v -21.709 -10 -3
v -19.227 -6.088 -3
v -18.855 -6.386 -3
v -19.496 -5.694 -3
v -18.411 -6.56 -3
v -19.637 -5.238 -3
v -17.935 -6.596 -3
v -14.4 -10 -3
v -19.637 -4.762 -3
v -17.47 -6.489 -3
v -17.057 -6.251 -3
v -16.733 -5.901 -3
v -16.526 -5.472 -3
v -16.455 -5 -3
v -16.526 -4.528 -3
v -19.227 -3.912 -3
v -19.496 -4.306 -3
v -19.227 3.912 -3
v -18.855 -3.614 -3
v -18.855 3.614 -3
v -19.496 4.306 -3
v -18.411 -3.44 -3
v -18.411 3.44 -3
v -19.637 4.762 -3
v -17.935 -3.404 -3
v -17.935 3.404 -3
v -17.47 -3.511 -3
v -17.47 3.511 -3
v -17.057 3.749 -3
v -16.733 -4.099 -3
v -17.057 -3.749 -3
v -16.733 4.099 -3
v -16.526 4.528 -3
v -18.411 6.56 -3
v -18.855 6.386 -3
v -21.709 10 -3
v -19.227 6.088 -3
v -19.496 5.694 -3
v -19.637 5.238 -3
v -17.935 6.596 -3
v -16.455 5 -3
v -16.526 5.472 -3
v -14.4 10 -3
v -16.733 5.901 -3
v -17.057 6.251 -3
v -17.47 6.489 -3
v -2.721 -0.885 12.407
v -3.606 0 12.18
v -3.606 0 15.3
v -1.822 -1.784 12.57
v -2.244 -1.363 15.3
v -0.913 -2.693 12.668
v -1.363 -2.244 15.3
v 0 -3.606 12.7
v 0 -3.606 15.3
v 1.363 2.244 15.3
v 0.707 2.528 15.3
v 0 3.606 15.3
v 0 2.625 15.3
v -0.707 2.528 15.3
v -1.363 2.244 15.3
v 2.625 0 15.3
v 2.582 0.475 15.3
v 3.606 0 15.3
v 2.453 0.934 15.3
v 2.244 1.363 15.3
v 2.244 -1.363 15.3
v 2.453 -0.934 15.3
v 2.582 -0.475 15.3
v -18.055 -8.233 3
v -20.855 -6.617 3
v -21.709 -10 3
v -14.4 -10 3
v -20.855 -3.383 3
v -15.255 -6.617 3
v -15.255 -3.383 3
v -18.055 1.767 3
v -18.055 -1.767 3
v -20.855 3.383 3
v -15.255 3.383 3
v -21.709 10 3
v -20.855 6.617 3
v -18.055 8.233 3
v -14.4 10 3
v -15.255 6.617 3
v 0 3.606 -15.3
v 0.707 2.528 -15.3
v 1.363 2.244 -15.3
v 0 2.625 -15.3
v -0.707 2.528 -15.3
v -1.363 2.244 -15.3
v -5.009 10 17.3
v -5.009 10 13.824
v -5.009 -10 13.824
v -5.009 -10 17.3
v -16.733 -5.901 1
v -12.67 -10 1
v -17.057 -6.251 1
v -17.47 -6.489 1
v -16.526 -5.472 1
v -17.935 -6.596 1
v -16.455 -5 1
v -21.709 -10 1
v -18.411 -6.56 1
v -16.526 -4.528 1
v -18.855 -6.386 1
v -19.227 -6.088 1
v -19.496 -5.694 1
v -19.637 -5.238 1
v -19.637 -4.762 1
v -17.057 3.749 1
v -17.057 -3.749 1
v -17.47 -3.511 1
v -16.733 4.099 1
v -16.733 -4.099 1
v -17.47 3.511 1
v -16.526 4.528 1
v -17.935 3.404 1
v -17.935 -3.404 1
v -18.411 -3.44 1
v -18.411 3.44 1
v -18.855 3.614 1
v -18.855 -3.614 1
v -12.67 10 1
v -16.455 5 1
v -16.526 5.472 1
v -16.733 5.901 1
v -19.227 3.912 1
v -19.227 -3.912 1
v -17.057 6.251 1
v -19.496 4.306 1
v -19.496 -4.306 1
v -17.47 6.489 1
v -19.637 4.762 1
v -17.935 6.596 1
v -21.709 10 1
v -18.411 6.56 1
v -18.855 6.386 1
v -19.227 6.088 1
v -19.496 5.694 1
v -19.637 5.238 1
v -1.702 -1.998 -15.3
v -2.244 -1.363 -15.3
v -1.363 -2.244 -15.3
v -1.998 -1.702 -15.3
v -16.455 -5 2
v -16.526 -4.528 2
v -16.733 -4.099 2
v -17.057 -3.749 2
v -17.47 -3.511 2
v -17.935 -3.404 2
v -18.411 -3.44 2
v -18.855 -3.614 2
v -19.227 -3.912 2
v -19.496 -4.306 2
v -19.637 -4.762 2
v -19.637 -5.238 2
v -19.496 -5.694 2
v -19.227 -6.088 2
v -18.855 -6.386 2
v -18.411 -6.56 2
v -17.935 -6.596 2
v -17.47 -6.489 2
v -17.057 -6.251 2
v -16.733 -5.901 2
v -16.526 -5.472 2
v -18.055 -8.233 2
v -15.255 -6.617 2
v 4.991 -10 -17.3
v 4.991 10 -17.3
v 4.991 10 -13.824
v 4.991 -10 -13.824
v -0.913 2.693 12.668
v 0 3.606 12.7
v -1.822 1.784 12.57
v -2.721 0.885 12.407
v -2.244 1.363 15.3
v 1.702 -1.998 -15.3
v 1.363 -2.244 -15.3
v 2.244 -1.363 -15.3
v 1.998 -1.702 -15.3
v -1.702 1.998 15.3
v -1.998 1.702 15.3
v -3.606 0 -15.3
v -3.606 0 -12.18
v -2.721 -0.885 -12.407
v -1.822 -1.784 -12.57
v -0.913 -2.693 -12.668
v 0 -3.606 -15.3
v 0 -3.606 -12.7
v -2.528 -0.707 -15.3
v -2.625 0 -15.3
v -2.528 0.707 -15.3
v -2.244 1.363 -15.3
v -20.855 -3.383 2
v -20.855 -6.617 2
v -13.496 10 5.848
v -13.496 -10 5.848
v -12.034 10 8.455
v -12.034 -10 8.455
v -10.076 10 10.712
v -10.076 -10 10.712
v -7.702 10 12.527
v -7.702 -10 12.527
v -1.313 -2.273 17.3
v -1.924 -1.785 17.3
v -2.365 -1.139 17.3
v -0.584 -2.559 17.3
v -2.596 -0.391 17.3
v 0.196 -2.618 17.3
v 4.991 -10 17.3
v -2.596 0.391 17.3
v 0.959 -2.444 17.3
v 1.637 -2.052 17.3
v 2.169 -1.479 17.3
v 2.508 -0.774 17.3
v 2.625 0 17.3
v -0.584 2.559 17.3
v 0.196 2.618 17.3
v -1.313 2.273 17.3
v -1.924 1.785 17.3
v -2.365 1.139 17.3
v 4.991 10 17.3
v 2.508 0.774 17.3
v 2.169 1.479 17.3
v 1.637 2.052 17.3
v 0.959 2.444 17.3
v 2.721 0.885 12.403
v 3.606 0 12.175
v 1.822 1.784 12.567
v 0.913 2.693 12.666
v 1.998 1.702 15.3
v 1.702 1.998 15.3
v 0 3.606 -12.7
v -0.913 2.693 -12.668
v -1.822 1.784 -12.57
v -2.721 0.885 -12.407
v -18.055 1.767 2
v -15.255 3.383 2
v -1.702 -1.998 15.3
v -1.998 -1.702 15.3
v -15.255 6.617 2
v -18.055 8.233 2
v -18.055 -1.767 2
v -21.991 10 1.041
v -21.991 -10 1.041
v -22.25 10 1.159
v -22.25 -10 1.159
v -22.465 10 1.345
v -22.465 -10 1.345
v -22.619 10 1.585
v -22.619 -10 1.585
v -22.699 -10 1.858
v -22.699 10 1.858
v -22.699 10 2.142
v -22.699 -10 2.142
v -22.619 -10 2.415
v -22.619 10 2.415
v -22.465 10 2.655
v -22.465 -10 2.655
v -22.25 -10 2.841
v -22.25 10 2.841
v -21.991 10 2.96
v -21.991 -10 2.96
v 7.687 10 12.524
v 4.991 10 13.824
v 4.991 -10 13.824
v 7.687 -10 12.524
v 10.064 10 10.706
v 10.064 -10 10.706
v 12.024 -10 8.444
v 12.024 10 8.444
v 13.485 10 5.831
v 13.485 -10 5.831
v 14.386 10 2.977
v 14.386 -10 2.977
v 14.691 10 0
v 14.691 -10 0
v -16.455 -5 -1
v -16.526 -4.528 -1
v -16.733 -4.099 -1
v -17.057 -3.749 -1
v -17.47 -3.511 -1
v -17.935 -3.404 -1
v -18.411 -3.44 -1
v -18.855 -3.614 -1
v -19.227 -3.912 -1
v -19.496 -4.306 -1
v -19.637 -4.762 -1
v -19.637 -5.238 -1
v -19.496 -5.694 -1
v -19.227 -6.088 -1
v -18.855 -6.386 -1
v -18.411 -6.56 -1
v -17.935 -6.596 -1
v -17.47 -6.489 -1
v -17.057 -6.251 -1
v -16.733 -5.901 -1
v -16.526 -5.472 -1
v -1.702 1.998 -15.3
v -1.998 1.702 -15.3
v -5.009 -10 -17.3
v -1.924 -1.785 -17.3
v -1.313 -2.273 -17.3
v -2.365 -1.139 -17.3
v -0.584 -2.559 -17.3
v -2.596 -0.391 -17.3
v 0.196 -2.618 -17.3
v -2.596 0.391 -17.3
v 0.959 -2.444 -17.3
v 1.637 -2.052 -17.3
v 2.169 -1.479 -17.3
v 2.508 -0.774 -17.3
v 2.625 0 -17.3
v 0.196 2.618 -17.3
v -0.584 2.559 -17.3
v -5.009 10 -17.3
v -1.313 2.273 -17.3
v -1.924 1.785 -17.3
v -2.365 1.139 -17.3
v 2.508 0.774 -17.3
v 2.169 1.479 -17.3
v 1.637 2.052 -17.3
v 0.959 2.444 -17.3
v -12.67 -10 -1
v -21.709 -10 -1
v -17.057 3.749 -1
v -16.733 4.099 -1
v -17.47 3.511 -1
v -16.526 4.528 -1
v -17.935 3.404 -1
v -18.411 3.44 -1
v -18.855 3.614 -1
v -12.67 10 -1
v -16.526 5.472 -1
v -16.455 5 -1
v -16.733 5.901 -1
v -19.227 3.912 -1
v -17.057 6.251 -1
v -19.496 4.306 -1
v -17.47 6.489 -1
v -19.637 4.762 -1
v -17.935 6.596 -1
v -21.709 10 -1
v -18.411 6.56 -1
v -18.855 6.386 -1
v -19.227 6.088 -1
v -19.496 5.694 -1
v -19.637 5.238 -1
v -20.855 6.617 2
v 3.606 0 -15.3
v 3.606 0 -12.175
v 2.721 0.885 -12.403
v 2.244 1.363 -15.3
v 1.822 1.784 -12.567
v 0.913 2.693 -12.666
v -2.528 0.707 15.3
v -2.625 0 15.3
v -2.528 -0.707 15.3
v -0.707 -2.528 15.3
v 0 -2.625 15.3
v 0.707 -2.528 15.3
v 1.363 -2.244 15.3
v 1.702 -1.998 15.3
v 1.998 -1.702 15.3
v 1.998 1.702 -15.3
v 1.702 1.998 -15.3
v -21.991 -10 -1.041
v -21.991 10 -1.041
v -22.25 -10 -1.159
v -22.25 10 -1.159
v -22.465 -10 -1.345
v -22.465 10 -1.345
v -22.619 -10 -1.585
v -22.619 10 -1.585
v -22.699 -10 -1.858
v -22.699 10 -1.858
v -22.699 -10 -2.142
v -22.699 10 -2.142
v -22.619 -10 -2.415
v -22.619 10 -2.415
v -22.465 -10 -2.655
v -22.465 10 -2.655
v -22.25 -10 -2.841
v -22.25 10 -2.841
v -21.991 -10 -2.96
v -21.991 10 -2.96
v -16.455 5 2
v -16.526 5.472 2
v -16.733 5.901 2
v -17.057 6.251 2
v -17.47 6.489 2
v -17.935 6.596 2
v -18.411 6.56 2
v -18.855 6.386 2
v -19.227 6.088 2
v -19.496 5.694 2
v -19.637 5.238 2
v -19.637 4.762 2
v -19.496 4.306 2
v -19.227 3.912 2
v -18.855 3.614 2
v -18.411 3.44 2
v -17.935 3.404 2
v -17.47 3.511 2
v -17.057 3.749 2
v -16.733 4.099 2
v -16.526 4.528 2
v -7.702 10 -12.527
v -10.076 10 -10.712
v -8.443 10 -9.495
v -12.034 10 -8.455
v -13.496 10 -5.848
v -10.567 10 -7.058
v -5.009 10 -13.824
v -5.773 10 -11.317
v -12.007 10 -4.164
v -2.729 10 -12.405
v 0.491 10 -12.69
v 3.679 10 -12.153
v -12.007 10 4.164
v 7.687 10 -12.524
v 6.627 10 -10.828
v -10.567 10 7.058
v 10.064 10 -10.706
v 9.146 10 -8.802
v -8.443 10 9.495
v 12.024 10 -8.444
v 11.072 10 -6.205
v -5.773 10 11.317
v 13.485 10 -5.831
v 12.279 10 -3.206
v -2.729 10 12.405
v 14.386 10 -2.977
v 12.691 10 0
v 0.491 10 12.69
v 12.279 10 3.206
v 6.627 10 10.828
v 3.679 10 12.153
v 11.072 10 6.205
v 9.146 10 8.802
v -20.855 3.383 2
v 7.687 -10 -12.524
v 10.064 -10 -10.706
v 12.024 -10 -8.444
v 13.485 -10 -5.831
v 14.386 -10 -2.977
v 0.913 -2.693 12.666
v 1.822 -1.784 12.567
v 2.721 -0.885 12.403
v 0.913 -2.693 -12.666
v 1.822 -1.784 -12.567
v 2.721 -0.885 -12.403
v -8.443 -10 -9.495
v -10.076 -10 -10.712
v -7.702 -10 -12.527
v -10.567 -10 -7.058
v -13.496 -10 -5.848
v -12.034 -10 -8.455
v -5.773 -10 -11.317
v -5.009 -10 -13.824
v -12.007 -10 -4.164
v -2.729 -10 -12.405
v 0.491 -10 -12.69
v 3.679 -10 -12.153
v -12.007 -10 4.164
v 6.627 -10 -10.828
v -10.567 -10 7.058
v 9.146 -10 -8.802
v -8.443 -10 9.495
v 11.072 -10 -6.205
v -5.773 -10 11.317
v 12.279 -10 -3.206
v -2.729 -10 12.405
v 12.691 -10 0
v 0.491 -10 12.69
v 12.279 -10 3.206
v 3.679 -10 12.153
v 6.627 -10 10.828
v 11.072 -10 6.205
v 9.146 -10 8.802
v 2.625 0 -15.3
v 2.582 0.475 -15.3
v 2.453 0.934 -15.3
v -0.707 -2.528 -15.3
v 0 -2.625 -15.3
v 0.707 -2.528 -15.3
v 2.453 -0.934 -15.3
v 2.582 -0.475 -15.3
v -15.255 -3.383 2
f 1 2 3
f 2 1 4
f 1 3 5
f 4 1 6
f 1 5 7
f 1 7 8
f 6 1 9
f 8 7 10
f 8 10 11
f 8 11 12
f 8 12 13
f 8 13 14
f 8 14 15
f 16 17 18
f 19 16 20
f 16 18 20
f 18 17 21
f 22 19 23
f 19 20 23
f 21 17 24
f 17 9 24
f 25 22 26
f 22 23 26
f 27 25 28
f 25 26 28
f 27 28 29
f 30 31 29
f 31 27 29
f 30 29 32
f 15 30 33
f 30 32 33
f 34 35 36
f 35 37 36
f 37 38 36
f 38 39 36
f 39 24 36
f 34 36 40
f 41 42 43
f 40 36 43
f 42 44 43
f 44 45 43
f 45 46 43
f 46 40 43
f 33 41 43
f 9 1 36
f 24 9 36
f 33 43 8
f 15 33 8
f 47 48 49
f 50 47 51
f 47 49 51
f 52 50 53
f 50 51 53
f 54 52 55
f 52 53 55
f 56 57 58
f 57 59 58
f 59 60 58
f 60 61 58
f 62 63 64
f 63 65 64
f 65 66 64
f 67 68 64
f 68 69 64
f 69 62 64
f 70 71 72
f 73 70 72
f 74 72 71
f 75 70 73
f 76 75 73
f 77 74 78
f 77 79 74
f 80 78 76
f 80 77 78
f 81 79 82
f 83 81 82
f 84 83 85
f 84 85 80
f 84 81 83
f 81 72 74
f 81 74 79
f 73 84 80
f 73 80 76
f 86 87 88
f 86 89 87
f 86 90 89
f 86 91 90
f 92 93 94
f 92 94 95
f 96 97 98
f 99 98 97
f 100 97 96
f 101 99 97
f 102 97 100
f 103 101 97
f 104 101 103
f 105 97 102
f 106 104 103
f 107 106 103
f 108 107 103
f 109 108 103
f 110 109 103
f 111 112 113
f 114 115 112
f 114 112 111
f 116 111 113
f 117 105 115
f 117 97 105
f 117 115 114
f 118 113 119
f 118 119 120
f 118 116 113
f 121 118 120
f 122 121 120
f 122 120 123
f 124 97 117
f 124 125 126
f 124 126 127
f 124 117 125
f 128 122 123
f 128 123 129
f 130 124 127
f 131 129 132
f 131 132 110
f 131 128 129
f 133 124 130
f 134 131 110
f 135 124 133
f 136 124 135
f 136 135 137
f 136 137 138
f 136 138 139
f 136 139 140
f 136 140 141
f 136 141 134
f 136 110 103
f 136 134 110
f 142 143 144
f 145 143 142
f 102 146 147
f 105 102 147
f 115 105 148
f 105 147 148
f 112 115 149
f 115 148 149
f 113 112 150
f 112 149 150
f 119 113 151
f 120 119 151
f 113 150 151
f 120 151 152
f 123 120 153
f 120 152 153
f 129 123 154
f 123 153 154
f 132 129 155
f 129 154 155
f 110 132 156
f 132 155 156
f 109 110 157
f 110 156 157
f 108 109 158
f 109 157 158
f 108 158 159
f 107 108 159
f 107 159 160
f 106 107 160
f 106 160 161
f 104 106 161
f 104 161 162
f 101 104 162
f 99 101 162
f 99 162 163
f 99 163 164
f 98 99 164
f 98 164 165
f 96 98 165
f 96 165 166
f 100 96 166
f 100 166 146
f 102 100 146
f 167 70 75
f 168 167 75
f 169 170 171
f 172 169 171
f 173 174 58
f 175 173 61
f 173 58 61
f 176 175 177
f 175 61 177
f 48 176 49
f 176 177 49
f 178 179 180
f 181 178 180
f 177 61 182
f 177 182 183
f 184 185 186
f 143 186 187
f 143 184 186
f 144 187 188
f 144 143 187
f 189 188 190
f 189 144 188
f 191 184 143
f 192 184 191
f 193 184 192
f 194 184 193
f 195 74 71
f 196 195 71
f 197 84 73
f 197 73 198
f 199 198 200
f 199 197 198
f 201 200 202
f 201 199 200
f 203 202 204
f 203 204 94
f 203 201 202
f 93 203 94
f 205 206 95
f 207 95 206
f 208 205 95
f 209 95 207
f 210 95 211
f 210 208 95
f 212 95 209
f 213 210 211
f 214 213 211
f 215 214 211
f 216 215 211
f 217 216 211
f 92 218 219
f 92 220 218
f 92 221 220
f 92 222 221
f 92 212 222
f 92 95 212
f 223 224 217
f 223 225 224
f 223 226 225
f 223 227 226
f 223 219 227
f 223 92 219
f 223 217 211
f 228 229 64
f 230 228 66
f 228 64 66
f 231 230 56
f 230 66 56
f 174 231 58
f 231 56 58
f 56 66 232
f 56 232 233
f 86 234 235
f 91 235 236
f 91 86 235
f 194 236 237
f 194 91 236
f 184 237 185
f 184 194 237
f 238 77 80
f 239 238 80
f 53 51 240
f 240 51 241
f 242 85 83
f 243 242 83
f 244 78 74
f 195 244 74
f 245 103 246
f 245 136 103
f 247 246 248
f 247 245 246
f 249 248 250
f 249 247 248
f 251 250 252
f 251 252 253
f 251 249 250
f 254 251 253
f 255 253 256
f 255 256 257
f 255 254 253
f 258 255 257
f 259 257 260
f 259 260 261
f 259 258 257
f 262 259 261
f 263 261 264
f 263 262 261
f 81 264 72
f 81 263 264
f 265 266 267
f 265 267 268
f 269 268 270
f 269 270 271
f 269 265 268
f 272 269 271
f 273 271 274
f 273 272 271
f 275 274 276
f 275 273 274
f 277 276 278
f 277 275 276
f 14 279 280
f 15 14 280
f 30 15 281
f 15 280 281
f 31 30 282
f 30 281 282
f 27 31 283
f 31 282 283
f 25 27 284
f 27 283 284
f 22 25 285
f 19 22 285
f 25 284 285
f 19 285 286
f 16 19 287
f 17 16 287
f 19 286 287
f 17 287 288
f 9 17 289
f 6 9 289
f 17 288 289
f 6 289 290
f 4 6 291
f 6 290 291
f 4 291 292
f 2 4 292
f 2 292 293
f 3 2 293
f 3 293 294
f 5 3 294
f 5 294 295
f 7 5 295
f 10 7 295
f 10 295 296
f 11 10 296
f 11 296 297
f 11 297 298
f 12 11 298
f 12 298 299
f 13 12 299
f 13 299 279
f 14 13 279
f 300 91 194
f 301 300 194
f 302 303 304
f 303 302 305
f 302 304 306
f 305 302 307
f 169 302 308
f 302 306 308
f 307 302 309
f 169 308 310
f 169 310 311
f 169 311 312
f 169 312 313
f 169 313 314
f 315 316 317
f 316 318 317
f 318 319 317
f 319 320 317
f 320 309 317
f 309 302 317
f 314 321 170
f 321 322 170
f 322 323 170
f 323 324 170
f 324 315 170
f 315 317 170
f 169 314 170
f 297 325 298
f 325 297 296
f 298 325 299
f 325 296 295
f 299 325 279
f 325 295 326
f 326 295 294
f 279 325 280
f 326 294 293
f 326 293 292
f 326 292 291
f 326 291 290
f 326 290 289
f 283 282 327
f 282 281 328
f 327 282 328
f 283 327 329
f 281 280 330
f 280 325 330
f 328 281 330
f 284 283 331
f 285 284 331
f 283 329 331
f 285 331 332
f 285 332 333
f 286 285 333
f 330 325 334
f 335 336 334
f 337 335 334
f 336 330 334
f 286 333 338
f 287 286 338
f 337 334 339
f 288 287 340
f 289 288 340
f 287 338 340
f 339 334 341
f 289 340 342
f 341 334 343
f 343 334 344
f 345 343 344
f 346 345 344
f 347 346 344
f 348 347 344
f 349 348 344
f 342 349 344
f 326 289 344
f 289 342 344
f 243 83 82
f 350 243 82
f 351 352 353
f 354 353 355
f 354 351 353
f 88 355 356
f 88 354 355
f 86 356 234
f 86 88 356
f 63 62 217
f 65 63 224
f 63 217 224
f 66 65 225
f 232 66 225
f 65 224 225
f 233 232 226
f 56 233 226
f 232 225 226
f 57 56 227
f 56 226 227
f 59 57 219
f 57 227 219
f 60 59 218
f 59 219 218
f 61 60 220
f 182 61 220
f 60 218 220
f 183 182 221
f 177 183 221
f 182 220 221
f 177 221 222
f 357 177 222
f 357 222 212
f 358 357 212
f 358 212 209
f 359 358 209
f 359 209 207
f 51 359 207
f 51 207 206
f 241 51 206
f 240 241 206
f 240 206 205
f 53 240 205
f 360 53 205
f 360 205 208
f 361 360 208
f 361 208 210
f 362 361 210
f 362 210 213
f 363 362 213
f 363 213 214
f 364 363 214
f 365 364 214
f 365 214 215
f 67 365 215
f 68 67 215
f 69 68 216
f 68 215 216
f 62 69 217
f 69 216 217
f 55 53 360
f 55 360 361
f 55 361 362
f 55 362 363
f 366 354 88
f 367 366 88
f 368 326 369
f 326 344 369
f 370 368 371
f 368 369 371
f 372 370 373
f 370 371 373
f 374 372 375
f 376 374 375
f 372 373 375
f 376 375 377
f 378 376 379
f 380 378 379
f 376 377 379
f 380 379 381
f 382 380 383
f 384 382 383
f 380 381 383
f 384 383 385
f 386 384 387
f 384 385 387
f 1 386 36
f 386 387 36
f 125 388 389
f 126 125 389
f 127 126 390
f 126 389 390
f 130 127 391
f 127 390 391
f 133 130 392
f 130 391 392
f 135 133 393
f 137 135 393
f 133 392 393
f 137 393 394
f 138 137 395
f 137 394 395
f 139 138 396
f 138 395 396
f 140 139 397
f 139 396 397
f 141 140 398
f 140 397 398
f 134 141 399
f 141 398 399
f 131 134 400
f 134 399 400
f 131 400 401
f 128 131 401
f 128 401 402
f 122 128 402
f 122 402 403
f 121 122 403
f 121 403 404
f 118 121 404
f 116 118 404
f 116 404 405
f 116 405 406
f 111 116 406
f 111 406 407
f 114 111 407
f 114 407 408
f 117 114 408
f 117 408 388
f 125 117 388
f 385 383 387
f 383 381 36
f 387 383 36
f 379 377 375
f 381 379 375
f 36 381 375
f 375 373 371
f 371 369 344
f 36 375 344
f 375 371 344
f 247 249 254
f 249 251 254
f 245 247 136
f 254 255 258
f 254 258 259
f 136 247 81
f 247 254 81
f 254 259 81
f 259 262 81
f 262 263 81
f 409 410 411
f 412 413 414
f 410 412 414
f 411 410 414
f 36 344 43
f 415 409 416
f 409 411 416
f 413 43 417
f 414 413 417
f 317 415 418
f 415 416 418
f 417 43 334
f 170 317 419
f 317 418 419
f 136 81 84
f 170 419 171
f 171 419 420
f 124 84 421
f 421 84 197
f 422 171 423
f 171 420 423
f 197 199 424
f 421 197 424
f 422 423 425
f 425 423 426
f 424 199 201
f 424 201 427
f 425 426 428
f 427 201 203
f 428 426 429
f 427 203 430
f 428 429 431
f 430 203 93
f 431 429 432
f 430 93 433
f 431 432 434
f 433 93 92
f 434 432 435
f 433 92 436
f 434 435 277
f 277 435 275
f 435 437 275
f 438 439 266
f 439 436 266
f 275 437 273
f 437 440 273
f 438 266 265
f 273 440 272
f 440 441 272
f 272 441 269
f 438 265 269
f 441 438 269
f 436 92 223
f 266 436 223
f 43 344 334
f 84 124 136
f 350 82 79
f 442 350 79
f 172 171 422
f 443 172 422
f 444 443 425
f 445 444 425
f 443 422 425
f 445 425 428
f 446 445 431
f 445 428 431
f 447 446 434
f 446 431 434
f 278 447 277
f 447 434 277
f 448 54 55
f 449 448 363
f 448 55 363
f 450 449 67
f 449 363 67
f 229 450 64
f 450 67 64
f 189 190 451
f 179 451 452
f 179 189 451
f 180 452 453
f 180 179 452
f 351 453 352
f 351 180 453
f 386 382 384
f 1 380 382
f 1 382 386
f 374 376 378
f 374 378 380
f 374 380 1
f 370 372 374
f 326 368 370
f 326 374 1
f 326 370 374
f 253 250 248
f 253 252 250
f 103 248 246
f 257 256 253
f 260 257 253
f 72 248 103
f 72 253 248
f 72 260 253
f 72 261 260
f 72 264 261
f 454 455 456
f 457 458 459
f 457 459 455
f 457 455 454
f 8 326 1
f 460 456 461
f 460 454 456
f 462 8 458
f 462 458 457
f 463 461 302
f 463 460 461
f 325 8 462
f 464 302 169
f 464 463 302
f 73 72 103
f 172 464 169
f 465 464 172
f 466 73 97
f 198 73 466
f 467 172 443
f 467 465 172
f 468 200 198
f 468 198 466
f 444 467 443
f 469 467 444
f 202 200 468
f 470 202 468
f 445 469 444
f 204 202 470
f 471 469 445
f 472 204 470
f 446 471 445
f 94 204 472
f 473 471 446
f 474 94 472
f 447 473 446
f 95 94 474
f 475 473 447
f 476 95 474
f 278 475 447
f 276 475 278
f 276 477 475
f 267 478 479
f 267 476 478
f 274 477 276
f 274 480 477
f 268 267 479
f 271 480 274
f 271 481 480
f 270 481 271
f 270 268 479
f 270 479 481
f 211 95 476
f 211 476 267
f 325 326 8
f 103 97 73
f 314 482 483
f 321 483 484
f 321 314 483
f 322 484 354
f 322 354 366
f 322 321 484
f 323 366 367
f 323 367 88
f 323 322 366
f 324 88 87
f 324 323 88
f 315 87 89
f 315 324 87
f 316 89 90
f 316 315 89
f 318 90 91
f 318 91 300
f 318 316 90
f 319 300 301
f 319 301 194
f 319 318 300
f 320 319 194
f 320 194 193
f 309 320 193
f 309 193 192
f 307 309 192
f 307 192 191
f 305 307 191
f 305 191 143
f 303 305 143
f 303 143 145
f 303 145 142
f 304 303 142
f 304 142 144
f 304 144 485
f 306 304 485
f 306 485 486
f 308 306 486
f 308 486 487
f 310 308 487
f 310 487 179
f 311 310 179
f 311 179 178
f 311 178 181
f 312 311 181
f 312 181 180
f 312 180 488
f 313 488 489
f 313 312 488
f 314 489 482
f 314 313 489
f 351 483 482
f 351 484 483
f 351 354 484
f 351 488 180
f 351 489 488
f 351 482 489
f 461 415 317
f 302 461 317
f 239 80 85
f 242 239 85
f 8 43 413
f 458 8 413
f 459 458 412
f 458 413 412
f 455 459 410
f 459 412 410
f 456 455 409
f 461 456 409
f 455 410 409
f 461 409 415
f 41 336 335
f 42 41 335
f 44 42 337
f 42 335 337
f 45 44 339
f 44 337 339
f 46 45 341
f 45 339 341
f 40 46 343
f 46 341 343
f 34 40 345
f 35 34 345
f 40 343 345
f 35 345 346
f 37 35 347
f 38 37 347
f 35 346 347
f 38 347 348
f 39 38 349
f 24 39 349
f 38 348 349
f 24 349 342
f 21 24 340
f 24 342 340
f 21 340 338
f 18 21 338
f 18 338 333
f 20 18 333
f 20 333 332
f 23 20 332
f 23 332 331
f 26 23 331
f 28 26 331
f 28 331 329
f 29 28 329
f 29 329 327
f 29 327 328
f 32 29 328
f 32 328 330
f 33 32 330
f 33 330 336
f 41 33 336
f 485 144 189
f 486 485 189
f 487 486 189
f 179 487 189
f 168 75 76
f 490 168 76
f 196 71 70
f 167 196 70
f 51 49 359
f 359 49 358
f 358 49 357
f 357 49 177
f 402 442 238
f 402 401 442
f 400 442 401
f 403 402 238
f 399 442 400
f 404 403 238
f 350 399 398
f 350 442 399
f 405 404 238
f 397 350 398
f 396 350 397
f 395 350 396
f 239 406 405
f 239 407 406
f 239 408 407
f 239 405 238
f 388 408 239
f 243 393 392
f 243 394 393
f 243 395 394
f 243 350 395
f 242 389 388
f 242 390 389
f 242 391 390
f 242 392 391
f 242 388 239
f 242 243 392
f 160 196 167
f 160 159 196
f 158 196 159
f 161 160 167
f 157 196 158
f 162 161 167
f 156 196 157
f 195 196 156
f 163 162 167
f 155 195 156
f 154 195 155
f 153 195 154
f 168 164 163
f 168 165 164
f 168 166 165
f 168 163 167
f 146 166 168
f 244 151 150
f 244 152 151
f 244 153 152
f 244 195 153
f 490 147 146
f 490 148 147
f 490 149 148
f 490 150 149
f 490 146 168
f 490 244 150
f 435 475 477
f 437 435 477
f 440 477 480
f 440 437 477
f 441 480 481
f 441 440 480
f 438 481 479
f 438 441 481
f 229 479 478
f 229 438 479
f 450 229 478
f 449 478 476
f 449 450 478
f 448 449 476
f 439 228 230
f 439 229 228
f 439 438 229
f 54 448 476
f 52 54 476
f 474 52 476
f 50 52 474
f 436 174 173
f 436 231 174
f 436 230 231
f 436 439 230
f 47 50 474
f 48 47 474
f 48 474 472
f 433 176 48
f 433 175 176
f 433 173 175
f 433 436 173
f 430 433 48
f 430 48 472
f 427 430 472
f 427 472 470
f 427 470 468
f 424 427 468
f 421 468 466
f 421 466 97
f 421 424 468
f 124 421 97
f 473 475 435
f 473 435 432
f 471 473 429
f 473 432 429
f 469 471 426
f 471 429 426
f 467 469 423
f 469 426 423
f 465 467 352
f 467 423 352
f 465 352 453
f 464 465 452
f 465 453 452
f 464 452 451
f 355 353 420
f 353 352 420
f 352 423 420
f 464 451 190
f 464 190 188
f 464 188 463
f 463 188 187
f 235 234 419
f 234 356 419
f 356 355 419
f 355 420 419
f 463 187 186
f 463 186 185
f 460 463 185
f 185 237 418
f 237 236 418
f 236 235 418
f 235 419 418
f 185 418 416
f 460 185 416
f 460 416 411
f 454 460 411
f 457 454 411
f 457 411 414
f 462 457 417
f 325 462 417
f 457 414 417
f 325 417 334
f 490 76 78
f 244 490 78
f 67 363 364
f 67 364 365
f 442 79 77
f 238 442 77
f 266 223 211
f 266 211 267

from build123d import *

# Parameters (mm, degrees)
BOSS_EXTRUDE1_DEPTH      = 10
CUT_EXTRUDE10_REACH      = 46.578
CUT_EXTRUDE10_END_RADIUS = 12.7
CUT_EXTRUDE10_START      = -2
SKETCH8_R                = 2.625
CUT_EXTRUDE11_DEPTH      = 2
CUT_EXTRUDE12_DEPTH      = 1
CUT_EXTRUDE13_REACH      = 33.436
SKETCH10_R               = 1.6


# Read off the part's stored shape, not the designer's step: Mirror2
with BuildPart() as part:
    # Sketch1 → Boss-Extrude1 (new, symmetric)
    with BuildSketch(Plane(origin=(0, 0, 0), x_dir=(1, 0, 0), z_dir=(0, 1, 0))):
        with BuildLine():
            Line((-12.709296078, -1.000053339), (-21.709296078, -1.000053339))
            ThreePointArc((-21.709296078, -1.000053339), (-22.709296078, -2.000053339), (-21.709296078, -3.000053339))
            Line((-21.709296078, -3.000053339), (-14.399918025, -3.000053339))
            ThreePointArc((-14.399918025, -3.000053339), (14.690703922, -5.3339e-05), (-14.399918025, 2.999946661))
            Line((-14.399918025, 2.999946661), (-21.709296078, 2.999946661))
            ThreePointArc((-21.709296078, 2.999946661), (-22.709296078, 1.999946661), (-21.709296078, 0.999946661))
            Line((-21.709296078, 0.999946661), (-12.709296078, 0.999946661))
            Line((-12.709296078, 0.999946661), (-12.669864786, 0.999946661))
            ThreePointArc((-12.669864786, 0.999946661), (12.690703922, -5.3339e-05), (-12.669864786, -1.000053339))
            Line((-12.669864786, -1.000053339), (-12.709296078, -1.000053339))
        make_face()
        with BuildLine():
            ThreePointArc((4.990703922, -13.823584002), (-0.009296078, -14.700053339), (-5.009296078, -13.823584002))
            Line((-5.009296078, -13.823584002), (-5.009296078, -14.750053339))
            Line((-5.009296078, -14.750053339), (-5.009296078, -17.300053339))
            Line((-5.009296078, -17.300053339), (4.990703922, -17.300053339))
            Line((4.990703922, -17.300053339), (4.990703922, -14.750053339))
            Line((4.990703922, -14.750053339), (4.990703922, -13.823584002))
        make_face()
        with BuildLine():
            Line((-5.009296078, 14.749946661), (-5.009296078, 13.823477324))
            ThreePointArc((-5.009296078, 13.823477324), (-0.009296078, 14.699946661), (4.990703922, 13.823477324))
            Line((4.990703922, 13.823477324), (4.990703922, 14.749946661))
            Line((4.990703922, 14.749946661), (4.990703922, 17.299946661))
            Line((4.990703922, 17.299946661), (-5.009296078, 17.299946661))
            Line((-5.009296078, 17.299946661), (-5.009296078, 14.749946661))
        make_face()
    extrude(amount=BOSS_EXTRUDE1_DEPTH, both=True)

    # Cut-Extrude10: up to this cylinder (the profile starts outside it)
    cut_extrude10_end = Plane(origin=(-0.009296078, 0, 5.3339e-05), z_dir=(0, -1, 0)) * Cylinder(CUT_EXTRUDE10_END_RADIUS, 119.556, mode=Mode.PRIVATE)
    # Sketch7 → Cut-Extrude10 (cut, up to the surface)
    with BuildSketch(Plane.XY.offset(17.300053339).offset(CUT_EXTRUDE10_START), mode=Mode.PRIVATE) as cut_extrude10_sk1:
        Polygon((0, 3.606244584), (-3.606244584, 0), (0, -3.606244584), (3.606244584, 0), align=None)
    cut_extrude10_tool1 = extrude(cut_extrude10_sk1.sketch, amount=-CUT_EXTRUDE10_REACH, mode=Mode.PRIVATE) - cut_extrude10_end
    add(cut_extrude10_tool1.solids().sort_by_distance((0, 0, 15.300053))[0], mode=Mode.SUBTRACT)

    # Sketch8 → Cut-Extrude11 (cut)
    with BuildSketch(Plane.XY.offset(17.300053339)):
        Circle(SKETCH8_R)
    extrude(amount=-CUT_EXTRUDE11_DEPTH, mode=Mode.SUBTRACT)

    # Mirror2
    split(bisect_by=Plane.XY, keep=Keep.TOP)

    # Mirror2 2: part across plane


with BuildPart() as part_1:
    add(part.part)
    add(part.part.mirror(Plane.XY))

    # Sketch9 → Cut-Extrude12 (cut)
    with BuildSketch(Plane.XY.offset(3.000053339)):
        Polygon((-18.054607052, 8.233161507), (-20.854607052, 6.616580754), (-20.854607052, 3.383419246), (-18.054607052, 1.766838493), (-15.254607052, 3.383419246), (-15.254607052, 6.616580754), align=None)
        Polygon((-18.054607052, -1.766838493), (-20.854607052, -3.383419246), (-20.854607052, -6.616580754), (-18.054607052, -8.233161507), (-15.254607052, -6.616580754), (-15.254607052, -3.383419246), align=None)
    extrude(amount=-CUT_EXTRUDE12_DEPTH, mode=Mode.SUBTRACT)

    # Cut-Extrude13: up to this face of the body (flat: up to its plane)
    cut_extrude13_end = Plane(part_1.part.faces().sort_by_distance((-18.054607052, 0, -3.000053339))[0])
    # Sketch10 → Cut-Extrude13 (cut, up to the picked face)
    with BuildSketch(Plane.XY.offset(2.000053339), mode=Mode.PRIVATE) as cut_extrude13_sk1:
        with Locations((-18.054607052, 5)):
            Circle(SKETCH10_R)
    cut_extrude13_tool1 = split(extrude(cut_extrude13_sk1.sketch, amount=-CUT_EXTRUDE13_REACH, mode=Mode.PRIVATE), bisect_by=cut_extrude13_end, keep=Keep.BOTH, mode=Mode.PRIVATE)
    # Sketch10 → Cut-Extrude13 (cut, up to the picked face)
    with BuildSketch(Plane.XY.offset(2.000053339), mode=Mode.PRIVATE) as cut_extrude13_sk2:
        with Locations((-18.054607052, -5)):
            Circle(SKETCH10_R)
    cut_extrude13_tool2 = split(extrude(cut_extrude13_sk2.sketch, amount=-CUT_EXTRUDE13_REACH, mode=Mode.PRIVATE), bisect_by=cut_extrude13_end, keep=Keep.BOTH, mode=Mode.PRIVATE)
    add(cut_extrude13_tool1.solids().sort_by(Axis((-18.054607, 5, 2.000053), (0, 0, -1)))[0], mode=Mode.SUBTRACT)
    add(cut_extrude13_tool2.solids().sort_by(Axis((-18.054607, -5, 2.000053), (0, 0, -1)))[0], mode=Mode.SUBTRACT)


solid = part_1.part
